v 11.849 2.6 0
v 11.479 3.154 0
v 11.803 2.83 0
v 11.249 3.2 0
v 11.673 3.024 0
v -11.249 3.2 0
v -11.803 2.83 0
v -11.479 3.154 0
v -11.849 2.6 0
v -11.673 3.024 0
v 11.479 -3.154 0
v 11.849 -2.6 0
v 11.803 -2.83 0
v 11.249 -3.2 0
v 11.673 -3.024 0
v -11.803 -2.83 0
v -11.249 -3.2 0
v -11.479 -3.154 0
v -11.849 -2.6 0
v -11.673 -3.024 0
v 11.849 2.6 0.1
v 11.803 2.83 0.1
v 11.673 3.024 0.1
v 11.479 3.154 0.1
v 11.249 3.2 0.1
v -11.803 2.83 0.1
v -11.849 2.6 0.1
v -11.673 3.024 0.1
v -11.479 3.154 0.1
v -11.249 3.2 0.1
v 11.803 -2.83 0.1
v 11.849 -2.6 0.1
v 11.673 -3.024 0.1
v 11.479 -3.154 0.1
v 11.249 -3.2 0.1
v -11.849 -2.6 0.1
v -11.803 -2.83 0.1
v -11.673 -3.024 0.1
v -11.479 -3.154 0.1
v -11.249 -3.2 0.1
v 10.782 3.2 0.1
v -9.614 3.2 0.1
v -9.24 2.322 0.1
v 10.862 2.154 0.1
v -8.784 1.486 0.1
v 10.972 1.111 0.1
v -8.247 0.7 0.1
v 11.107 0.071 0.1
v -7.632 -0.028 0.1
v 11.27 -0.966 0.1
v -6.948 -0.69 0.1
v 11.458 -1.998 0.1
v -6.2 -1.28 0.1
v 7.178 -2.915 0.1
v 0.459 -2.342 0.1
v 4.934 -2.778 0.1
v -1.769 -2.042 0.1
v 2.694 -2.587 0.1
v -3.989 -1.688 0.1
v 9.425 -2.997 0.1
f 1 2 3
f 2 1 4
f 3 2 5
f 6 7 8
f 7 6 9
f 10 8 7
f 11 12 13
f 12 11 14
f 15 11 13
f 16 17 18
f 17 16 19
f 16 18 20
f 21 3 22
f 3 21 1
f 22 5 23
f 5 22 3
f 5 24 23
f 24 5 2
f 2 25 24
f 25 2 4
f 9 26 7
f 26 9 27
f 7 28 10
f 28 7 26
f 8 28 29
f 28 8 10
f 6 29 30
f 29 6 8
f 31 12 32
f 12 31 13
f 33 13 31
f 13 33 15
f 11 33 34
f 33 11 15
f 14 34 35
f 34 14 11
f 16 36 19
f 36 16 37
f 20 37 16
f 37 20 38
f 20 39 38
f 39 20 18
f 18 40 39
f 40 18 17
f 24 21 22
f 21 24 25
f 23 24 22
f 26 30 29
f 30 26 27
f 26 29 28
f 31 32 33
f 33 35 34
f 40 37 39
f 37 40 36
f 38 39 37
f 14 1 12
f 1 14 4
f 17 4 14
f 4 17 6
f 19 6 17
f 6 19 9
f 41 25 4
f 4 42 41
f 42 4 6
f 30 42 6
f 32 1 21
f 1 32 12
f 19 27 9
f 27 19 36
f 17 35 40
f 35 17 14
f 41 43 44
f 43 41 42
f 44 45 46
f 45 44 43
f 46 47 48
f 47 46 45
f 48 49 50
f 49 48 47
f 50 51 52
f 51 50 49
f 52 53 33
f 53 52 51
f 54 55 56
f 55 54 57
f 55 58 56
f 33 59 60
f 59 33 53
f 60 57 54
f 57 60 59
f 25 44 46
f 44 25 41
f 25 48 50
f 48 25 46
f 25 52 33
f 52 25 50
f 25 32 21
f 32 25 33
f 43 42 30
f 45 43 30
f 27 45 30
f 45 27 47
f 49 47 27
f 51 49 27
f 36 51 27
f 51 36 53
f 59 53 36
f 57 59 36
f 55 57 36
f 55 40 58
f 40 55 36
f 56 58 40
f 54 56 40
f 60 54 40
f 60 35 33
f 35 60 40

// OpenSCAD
// file: ../p/1-8chrd.scad
use <../lib.scad>
function ldraw_lib__1_8chrd() = [
// 0 Chord 0.125
// 0 Name: 1-8chrd.dat
// 0 Author: Orion Pobursky [OrionP]
// 0 !LDRAW_ORG Primitive UPDATE 2023-05
// 0 !LICENSE Licensed under CC BY 4.0 : see CAreadme.txt
// 
// 0 BFC CERTIFY CCW
  [0,"BFC","CERTIFY"],
  [0,"BFC","CCW"],
// 
// 0 !HISTORY 2004-04-22 [PTadmin] Official Update 2004-02
// 0 !HISTORY 2007-06-22 [PTadmin] Header formatted for Contributor Agreement
// 0 !HISTORY 2008-07-01 [PTadmin] Official Update 2008-01
// 0 !HISTORY 2023-10-27 [OrionP] Rebuilt with PrimGen2, original author westrate
// 0 !HISTORY 2023-10-31 [OrionP] Official Update 2023-05
// 
// 3 16 1 0 0 0.9239 0 0.3827 0.7071 0 0.7071
  [3,16,1,0,0,0.9239,0,0.3827,0.7071,0,0.7071],
];
module ldraw_lib__1_8chrd(step=0, col=false, unit=2/5, alt=false, line=0.2, solid=!$preview)
    makepoly(ldraw_lib__1_8chrd(), step=step, col=col, unit=unit, alt=alt, line=line, solid=solid);
ldraw_lib__1_8chrd(line=0.2);
// file: ../p/1-4cyli.scad
use <../lib.scad>
function ldraw_lib__1_4cyli() = [
// 0 Cylinder 0.25
// 0 Name: 1-4cyli.dat
// 0 Author: James Jessiman
// 0 !LDRAW_ORG Primitive UPDATE 2012-01
// 0 !LICENSE Licensed under CC BY 4.0 : see CAreadme.txt
// 
// 0 BFC CERTIFY CCW
  [0,"BFC","CERTIFY"],
  [0,"BFC","CCW"],
// 
// 0 !HISTORY 2002-03-23 [sbliss] Added BFC statement.
// 0 !HISTORY 2002-04-25 [PTadmin] Official Update 2002-02
// 0 !HISTORY 2007-06-22 [PTadmin] Header formatted for Contributor Agreement
// 0 !HISTORY 2008-07-01 [PTadmin] Official Update 2008-01
// 0 !HISTORY 2012-02-16 [Philo] Changed to CCW
// 0 !HISTORY 2012-03-30 [PTadmin] Official Update 2012-01
// 
// 
// 4 16 1 1 0 0.9239 1 0.3827 0.9239 0 0.3827 1 0 0
  [4,16,1,1,0,0.9239,1,0.3827,0.9239,0,0.3827,1,0,0],
// 5 24 1 0 0 1 1 0 0.9239 0 0.3827 1 0 -1
  [5,24,1,0,0,1,1,0,0.9239,0,0.3827,1,0,-1],
// 4 16 0.9239 1 0.3827 0.7071 1 0.7071 0.7071 0 0.7071 0.9239 0 0.3827
  [4,16,0.9239,1,0.3827,0.7071,1,0.7071,0.7071,0,0.7071,0.9239,0,0.3827],
// 5 24 0.9239 0 0.3827 0.9239 1 0.3827 0.7071 0 0.7071 1 0 0
  [5,24,0.9239,0,0.3827,0.9239,1,0.3827,0.7071,0,0.7071,1,0,0],
// 4 16 0.7071 1 0.7071 0.3827 1 0.9239 0.3827 0 0.9239 0.7071 0 0.7071
  [4,16,0.7071,1,0.7071,0.3827,1,0.9239,0.3827,0,0.9239,0.7071,0,0.7071],
// 5 24 0.7071 0 0.7071 0.7071 1 0.7071 0.3827 0 0.9239 0.9239 0 0.3827
  [5,24,0.7071,0,0.7071,0.7071,1,0.7071,0.3827,0,0.9239,0.9239,0,0.3827],
// 4 16 0.3827 1 0.9239 0 1 1 0 0 1 0.3827 0 0.9239
  [4,16,0.3827,1,0.9239,0,1,1,0,0,1,0.3827,0,0.9239],
// 5 24 0.3827 0 0.9239 0.3827 1 0.9239 0 0 1 0.7071 0 0.7071
  [5,24,0.3827,0,0.9239,0.3827,1,0.9239,0,0,1,0.7071,0,0.7071],
// 5 24 0 0 1 0 1 1 0.3827 0 0.9239 -1 0 1
  [5,24,0,0,1,0,1,1,0.3827,0,0.9239,-1,0,1],
];
module ldraw_lib__1_4cyli(step=0, col=false, unit=2/5, alt=false, line=0.2, solid=!$preview)
    makepoly(ldraw_lib__1_4cyli(), step=step, col=col, unit=unit, alt=alt, line=line, solid=solid);
ldraw_lib__1_4cyli(line=0.2);
// file: ../p/1-4chrd.scad
use <../lib.scad>
function ldraw_lib__1_4chrd() = [
// 0 Chord 0.25
// 0 Name: 1-4chrd.dat
// 0 Author: Max Martin Richter [MMR1988]
// 0 !LDRAW_ORG Primitive UPDATE 2023-05
// 0 !LICENSE Licensed under CC BY 4.0 : see CAreadme.txt
// 
// 0 BFC CERTIFY CCW
  [0,"BFC","CERTIFY"],
  [0,"BFC","CCW"],
// 
// 0 !HISTORY 2004-04-22 [PTadmin] Official Update 2004-02
// 0 !HISTORY 2007-10-09 [PTadmin] Header formatted for Contributor Agreement
// 0 !HISTORY 2008-07-01 [PTadmin] Official Update 2008-01
// 0 !HISTORY 2012-08-02 [MMR1988] Re-creation with PrimGen2 and Rectifier
// 0 !HISTORY 2012-08-09 [PTadmin] Official Update 2012-02
// 0 !HISTORY 2023-10-27 [OrionP] Change author to MMR1988 from hafhead
// 0 !HISTORY 2023-10-31 [OrionP] Official Update 2023-05
// 
// 4 16 0.9239 0 0.3827 0.3827 0 0.9239 0 0 1 1 0 0
  [4,16,0.9239,0,0.3827,0.3827,0,0.9239,0,0,1,1,0,0],
// 3 16 0.7071 0 0.7071 0.3827 0 0.9239 0.9239 0 0.3827
  [3,16,0.7071,0,0.7071,0.3827,0,0.9239,0.9239,0,0.3827],
];
module ldraw_lib__1_4chrd(step=0, col=false, unit=2/5, alt=false, line=0.2, solid=!$preview)
    makepoly(ldraw_lib__1_4chrd(), step=step, col=col, unit=unit, alt=alt, line=line, solid=solid);
ldraw_lib__1_4chrd(line=0.2);
// main file
use <../lib.scad>
use <6141955j.scad>
function ldraw_lib__6141955l() = [
// 0 Sticker  0.8 x  3.0 with Black Trapezoid on Blue Background Right
// 0 Name: 6141955l.dat
// 0 Author: Massimo Maso [Sirio]
// 0 !LDRAW_ORG Part UPDATE 2025-03
// 0 !LICENSE Licensed under CC BY 4.0 : see CAreadme.txt
// 
// 0 BFC CERTIFY CCW
  [0,"BFC","CERTIFY"],
  [0,"BFC","CCW"],
// 
// 0 !KEYWORDS Bricklink 75871stk01a, Brickowl 197362, Ford, GT, Mustang
// 0 !KEYWORDS Rebrickable 24746, Set 75871, Speed Champions
// 
// 0 !HISTORY 2025-03-30 [OrionP] Official Update 2025-03
// 
// 1 16 0 0 0 -1 0 0 0 1 0 0 0 1 6141955j.dat
  [1,16,0,0,0,-1,0,0,0,1,0,0,0,1, ldraw_lib__6141955j()],
];
module ldraw_lib__6141955l(step=0, col=false, unit=2/5, alt=false, line=0.2, solid=!$preview)
    makepoly(ldraw_lib__6141955l(), step=step, col=col, unit=unit, alt=alt, line=line, solid=solid);
ldraw_lib__6141955l(line=0.2);
